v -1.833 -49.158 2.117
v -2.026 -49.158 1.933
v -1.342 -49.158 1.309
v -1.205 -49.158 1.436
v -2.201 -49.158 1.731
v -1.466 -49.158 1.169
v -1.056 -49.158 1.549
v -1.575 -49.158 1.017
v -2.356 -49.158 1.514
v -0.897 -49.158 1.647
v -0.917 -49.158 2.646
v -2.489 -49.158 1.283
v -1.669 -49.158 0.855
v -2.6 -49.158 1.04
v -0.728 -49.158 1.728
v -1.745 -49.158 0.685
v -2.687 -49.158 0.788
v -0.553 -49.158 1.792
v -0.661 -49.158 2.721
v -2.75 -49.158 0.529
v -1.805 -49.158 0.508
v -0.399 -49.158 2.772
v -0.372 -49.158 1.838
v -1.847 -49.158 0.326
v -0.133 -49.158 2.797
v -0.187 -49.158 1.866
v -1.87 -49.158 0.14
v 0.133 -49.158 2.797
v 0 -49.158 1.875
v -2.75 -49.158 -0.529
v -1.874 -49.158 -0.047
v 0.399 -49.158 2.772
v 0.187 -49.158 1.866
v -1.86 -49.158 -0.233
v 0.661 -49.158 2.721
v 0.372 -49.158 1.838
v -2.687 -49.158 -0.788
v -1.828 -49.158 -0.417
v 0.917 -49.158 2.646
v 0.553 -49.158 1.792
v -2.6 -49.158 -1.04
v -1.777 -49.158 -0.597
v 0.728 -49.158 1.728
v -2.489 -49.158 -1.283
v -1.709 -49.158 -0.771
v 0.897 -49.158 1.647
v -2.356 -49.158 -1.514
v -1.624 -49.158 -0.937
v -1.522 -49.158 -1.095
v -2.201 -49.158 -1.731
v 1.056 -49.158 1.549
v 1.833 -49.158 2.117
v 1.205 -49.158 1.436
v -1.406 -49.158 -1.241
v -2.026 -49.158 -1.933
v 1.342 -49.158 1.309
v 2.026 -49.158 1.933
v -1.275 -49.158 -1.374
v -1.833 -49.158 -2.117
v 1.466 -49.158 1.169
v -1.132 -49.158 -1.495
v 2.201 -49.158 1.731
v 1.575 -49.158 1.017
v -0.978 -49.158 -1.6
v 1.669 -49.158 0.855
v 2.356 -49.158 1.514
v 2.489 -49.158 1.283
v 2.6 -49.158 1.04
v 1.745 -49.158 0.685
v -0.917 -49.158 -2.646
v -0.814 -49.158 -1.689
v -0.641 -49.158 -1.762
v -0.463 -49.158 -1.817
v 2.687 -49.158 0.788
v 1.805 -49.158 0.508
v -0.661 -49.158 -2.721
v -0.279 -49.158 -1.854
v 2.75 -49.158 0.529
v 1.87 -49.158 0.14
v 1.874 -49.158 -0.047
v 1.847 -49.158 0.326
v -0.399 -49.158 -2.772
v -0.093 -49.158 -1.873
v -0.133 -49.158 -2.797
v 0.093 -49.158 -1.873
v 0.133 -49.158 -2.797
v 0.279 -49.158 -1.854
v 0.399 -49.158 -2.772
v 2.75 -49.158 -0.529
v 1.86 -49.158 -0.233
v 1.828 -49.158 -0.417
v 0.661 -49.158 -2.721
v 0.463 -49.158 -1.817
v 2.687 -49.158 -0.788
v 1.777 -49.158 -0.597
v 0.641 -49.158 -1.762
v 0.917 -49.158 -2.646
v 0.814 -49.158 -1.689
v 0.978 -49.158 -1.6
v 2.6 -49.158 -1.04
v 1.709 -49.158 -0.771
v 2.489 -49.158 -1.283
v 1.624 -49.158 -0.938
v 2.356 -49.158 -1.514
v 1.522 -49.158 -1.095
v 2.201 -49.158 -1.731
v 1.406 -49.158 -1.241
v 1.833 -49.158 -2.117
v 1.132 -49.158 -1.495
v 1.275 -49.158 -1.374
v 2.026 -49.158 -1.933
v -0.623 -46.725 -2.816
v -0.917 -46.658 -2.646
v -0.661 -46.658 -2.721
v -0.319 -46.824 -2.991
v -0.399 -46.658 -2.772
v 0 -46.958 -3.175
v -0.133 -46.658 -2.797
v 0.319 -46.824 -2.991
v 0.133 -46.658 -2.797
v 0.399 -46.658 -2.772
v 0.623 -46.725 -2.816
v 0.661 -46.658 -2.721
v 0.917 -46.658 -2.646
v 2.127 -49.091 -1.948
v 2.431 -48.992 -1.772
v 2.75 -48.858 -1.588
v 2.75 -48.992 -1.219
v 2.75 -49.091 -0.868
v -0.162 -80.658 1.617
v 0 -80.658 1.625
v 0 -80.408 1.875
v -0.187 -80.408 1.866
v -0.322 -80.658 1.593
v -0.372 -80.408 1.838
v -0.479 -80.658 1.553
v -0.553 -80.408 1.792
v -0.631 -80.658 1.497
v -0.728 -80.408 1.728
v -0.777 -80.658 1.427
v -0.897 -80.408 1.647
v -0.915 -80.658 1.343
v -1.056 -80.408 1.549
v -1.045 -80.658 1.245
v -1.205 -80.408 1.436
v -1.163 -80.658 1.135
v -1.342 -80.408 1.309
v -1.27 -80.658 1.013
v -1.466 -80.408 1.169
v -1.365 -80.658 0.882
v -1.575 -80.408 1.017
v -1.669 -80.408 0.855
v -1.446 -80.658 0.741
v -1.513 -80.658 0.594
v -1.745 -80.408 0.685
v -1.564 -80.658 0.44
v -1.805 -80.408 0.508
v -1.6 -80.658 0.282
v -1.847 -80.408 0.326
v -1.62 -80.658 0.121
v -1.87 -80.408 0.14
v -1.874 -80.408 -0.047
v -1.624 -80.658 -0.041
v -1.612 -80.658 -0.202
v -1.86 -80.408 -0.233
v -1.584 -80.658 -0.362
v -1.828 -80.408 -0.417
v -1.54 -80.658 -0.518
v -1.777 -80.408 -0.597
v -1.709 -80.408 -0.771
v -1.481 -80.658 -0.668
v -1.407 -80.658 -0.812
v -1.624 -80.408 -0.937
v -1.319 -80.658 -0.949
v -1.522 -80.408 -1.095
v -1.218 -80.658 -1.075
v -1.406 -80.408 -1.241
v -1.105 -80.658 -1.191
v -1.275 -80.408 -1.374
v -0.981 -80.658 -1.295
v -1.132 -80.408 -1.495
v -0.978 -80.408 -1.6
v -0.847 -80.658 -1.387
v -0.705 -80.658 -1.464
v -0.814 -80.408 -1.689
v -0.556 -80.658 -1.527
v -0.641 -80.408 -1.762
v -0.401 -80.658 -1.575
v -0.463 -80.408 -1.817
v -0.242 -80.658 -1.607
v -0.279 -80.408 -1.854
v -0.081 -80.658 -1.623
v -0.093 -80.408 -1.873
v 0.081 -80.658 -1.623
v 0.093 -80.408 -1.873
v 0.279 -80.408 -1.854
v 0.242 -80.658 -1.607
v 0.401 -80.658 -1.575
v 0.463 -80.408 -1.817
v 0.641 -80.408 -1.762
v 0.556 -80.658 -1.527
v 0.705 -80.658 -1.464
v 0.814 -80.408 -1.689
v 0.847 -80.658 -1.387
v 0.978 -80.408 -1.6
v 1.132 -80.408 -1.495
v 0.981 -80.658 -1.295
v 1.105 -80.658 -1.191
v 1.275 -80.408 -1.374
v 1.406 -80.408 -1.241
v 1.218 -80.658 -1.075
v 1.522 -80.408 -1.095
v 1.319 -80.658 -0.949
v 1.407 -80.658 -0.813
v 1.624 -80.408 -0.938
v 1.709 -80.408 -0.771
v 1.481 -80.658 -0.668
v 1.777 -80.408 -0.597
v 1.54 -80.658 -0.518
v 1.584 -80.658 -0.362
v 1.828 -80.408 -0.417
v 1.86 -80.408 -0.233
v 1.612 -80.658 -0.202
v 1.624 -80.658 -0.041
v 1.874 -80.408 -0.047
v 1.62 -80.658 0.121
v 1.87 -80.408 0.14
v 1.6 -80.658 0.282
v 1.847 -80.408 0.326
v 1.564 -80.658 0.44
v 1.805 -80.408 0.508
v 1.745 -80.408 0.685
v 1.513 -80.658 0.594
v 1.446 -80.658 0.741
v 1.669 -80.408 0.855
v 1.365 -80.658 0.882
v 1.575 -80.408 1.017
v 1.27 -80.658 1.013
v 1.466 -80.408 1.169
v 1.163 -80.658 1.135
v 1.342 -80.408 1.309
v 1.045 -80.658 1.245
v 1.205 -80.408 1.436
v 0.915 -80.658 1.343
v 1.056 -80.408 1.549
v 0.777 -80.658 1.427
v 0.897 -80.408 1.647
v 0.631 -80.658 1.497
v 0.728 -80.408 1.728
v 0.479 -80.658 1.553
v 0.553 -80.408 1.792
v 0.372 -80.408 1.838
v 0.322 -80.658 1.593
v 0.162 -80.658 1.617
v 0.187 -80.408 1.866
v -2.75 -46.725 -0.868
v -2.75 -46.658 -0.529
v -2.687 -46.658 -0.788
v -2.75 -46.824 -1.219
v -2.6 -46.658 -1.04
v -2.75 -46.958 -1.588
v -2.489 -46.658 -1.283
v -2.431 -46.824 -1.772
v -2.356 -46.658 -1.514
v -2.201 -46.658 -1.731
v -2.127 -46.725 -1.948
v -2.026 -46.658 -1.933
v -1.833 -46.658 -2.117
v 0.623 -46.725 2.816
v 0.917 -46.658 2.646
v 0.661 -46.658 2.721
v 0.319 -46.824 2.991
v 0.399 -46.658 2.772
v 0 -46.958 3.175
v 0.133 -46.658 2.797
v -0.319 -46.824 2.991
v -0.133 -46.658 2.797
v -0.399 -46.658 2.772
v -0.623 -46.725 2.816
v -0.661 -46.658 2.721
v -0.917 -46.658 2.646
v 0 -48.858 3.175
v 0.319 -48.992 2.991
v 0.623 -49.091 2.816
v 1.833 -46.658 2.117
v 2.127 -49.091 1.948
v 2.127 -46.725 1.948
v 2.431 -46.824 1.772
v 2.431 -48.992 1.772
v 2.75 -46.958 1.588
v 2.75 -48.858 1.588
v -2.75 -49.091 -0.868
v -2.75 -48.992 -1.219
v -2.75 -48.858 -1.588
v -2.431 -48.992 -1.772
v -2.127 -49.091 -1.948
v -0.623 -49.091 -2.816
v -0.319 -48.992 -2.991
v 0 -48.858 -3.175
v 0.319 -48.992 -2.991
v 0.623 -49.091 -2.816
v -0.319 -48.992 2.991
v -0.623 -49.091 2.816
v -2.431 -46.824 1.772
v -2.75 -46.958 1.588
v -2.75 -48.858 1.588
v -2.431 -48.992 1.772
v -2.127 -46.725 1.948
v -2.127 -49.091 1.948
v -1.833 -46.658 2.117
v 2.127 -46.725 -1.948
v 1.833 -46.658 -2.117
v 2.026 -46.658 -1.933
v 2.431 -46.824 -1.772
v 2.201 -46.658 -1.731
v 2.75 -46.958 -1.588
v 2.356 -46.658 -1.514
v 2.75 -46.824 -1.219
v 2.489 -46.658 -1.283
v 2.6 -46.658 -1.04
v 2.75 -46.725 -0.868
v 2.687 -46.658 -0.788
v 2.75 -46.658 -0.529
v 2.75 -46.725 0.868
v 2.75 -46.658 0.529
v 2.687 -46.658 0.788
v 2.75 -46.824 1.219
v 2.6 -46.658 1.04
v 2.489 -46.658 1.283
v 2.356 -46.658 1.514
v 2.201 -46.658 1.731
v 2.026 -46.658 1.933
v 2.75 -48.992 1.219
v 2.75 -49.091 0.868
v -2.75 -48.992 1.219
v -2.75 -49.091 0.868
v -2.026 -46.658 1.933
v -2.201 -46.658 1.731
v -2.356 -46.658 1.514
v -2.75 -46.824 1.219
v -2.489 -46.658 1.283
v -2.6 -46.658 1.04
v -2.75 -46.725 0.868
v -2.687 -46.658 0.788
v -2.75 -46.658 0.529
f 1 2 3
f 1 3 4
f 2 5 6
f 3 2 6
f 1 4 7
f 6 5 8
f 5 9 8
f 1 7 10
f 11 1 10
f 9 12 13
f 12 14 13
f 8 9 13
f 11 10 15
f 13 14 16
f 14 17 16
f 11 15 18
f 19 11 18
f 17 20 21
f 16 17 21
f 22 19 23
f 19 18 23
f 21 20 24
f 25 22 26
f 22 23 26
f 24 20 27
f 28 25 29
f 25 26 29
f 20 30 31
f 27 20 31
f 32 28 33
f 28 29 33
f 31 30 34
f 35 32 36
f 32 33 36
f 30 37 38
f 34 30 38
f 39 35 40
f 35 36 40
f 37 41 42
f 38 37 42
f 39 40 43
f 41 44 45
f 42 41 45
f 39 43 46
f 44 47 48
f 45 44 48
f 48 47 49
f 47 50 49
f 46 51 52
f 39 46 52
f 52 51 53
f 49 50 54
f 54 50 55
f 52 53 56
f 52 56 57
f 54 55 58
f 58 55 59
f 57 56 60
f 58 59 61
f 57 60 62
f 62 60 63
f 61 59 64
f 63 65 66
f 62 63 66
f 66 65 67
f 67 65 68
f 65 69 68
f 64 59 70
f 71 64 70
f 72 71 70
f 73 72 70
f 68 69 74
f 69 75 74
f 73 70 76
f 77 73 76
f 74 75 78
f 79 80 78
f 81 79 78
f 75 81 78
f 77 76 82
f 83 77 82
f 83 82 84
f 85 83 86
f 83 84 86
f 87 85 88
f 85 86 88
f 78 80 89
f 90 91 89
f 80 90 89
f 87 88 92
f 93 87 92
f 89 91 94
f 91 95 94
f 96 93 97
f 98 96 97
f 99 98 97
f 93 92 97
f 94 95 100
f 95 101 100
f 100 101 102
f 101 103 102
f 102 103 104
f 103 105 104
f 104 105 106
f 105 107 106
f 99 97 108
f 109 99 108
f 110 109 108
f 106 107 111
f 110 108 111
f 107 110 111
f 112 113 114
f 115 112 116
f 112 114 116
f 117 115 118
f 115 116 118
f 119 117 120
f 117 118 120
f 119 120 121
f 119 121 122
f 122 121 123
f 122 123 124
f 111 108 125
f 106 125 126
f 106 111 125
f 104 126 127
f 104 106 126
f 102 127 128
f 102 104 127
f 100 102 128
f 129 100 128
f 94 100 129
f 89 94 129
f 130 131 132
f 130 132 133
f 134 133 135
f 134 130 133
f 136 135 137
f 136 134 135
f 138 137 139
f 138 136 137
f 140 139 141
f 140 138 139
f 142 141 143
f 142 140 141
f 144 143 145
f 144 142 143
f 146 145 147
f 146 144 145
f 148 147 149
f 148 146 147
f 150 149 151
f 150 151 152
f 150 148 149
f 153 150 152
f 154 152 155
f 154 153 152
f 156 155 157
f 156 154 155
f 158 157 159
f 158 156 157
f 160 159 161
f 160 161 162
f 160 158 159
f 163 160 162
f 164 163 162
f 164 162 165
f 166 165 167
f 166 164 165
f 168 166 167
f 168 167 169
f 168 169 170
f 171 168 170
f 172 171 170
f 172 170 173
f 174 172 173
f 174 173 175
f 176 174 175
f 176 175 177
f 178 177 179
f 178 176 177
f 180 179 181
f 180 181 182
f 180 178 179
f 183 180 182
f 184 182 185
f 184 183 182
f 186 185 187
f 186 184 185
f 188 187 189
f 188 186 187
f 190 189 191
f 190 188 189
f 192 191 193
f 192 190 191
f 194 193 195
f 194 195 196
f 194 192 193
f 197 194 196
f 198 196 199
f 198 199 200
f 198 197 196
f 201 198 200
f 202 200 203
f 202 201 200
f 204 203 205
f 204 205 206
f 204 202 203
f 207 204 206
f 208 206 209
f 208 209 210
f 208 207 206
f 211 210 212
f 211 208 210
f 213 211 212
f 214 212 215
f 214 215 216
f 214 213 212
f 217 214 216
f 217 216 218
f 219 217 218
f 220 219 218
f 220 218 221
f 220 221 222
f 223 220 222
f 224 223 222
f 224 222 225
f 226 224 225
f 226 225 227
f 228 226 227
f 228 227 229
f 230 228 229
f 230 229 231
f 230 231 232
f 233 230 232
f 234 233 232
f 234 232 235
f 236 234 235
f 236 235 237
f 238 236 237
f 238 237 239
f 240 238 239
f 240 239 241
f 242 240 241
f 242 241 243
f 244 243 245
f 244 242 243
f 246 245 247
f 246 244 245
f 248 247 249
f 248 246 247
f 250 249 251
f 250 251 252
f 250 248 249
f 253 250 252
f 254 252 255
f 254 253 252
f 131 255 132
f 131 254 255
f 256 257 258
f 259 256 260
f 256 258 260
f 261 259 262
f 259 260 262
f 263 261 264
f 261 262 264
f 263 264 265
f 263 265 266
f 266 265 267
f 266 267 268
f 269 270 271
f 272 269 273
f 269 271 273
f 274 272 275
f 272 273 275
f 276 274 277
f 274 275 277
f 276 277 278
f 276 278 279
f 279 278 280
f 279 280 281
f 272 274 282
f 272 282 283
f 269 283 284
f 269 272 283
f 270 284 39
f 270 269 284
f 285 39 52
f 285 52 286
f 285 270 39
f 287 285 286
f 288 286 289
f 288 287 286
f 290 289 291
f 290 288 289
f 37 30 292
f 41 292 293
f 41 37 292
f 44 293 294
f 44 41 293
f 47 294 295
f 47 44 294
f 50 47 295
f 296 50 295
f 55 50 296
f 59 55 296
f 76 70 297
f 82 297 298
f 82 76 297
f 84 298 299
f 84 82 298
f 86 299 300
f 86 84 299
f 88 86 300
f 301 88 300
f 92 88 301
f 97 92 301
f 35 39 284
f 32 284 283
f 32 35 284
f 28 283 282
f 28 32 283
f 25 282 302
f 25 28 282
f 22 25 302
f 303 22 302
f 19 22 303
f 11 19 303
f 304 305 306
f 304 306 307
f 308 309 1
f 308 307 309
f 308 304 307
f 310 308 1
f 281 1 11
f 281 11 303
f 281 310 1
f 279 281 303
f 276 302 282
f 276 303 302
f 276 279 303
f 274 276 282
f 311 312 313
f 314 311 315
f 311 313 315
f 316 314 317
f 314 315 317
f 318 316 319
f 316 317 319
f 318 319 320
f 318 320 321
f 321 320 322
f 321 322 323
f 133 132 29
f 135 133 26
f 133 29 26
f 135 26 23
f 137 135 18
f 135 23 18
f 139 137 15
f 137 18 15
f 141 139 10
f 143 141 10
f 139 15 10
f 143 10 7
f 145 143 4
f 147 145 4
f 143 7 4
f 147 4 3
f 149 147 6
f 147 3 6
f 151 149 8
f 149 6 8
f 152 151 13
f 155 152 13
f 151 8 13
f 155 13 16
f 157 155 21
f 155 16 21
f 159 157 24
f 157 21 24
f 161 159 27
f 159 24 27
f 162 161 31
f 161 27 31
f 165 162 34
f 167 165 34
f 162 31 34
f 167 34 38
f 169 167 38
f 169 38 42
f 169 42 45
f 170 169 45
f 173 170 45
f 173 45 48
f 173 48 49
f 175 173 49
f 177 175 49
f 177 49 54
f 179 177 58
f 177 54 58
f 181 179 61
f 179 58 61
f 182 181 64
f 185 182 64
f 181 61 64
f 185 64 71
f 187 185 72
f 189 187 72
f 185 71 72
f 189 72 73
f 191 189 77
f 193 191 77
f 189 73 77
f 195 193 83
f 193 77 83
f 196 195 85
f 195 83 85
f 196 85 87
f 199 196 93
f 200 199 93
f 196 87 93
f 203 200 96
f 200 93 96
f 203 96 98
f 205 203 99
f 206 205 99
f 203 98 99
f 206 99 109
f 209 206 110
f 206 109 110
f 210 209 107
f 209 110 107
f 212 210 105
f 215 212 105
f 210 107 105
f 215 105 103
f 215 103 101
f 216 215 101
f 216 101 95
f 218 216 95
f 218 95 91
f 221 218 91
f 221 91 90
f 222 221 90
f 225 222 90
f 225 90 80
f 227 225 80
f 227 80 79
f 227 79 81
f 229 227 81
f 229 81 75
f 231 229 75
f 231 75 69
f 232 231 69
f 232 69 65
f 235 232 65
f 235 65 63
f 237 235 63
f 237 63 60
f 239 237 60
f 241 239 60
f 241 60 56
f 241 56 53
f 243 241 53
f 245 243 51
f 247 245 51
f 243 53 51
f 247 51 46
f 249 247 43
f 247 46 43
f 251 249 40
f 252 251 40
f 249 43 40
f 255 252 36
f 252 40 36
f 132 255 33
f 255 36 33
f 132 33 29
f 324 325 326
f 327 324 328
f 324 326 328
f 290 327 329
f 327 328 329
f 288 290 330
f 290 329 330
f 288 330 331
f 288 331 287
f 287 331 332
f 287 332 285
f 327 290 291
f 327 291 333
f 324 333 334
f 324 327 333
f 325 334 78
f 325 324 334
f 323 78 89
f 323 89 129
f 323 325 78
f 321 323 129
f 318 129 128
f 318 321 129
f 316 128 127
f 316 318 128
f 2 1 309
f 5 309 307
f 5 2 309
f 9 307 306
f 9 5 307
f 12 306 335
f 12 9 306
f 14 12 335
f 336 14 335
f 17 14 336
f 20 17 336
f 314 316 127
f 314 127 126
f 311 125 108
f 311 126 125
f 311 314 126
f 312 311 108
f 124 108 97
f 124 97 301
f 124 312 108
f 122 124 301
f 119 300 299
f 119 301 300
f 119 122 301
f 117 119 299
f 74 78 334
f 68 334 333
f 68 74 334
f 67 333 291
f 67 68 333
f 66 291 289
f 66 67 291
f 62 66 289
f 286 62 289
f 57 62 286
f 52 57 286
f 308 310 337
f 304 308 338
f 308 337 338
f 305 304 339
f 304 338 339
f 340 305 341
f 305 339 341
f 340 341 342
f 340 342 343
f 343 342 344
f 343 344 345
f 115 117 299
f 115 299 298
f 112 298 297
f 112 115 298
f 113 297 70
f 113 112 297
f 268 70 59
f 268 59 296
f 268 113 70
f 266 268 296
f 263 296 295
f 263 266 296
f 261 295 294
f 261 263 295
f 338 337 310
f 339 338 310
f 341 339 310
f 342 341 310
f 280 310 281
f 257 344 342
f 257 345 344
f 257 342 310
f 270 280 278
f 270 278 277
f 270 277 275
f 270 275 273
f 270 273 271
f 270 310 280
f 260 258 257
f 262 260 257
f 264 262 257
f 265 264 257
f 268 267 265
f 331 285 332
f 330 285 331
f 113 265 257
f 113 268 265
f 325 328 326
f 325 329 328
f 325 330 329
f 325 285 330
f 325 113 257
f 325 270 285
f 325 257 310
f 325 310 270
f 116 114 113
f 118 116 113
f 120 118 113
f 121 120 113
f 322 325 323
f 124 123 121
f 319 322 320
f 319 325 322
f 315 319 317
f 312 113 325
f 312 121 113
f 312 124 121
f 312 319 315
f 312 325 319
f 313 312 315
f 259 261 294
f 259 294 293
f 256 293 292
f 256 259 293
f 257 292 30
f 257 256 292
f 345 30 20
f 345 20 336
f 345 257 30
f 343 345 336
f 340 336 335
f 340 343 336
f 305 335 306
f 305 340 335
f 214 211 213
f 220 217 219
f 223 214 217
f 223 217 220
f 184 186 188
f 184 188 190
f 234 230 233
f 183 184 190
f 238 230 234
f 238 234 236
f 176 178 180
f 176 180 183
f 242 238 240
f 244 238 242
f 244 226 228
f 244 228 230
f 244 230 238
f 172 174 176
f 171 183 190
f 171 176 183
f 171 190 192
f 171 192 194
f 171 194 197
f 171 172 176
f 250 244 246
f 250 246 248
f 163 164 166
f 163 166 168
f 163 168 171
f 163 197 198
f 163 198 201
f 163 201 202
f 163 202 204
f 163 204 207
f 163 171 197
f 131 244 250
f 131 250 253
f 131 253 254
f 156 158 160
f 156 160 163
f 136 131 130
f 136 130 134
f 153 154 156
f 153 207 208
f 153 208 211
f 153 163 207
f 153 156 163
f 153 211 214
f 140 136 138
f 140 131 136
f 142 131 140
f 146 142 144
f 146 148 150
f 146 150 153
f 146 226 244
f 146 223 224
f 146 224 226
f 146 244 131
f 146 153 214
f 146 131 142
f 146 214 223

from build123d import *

# Parameters (mm, degrees)
BOSS_EXTRUDE1_DEPTH = 10
SKETCH2_R           = 7.5
BOSS_EXTRUDE2_DEPTH = 126
CHAMFER1_SIZE       = 1
SCALE1_SCALE        = 0.25


with BuildPart() as part:
    # Sketch1 → Boss-Extrude1 (new body)
    with BuildSketch(Plane(origin=(0, 0, 0), x_dir=(1, 0, 0), z_dir=(0, 1, 0))):
        Polygon((11, -6.350852961), (11, 6.350852961), (0, 12.701705922), (-11, 6.350852961), (-11, -6.350852961), (0, -12.701705922), align=None)
    extrude(amount=-BOSS_EXTRUDE1_DEPTH)

    # Sketch2 → Boss-Extrude2 (add)
    with BuildSketch(Plane.XZ.offset(10)):
        with Locations(Location((0, 0, 0), (0, 0, 90))):
            Circle(SKETCH2_R)
    extrude(amount=BOSS_EXTRUDE2_DEPTH)

    # Sketch3 → Cut-Revolve1 (revolve, cut)
    with BuildSketch(Plane(origin=(0, 0, 0), x_dir=(0, 0, -1), z_dir=(1, 0, 0))):
        Polygon((-12.701705922, -1.2), (-11.201705922, 0), (-12.701705922, 0), align=None)
        Polygon((-12.701705922, -10), (-12.701705922, -8.8), (-11.201705922, -10), align=None)
    revolve(axis=Axis((0, 3.86627359, 0), (0, -1, 0)), mode=Mode.SUBTRACT)

    # Chamfer1
    chamfer1_edges = [part.edges().sort_by_distance(p)[0] for p in [
        (0, -136, -7.5),
    ]]
    chamfer(chamfer1_edges, length=CHAMFER1_SIZE)


with BuildPart() as part_1:
    # Scale1: scaled about (0, -62.210522466, 0)
    add(part.part.scale(SCALE1_SCALE).moved(Location((0, -46.65789185, 0))))


solid = part_1.part
